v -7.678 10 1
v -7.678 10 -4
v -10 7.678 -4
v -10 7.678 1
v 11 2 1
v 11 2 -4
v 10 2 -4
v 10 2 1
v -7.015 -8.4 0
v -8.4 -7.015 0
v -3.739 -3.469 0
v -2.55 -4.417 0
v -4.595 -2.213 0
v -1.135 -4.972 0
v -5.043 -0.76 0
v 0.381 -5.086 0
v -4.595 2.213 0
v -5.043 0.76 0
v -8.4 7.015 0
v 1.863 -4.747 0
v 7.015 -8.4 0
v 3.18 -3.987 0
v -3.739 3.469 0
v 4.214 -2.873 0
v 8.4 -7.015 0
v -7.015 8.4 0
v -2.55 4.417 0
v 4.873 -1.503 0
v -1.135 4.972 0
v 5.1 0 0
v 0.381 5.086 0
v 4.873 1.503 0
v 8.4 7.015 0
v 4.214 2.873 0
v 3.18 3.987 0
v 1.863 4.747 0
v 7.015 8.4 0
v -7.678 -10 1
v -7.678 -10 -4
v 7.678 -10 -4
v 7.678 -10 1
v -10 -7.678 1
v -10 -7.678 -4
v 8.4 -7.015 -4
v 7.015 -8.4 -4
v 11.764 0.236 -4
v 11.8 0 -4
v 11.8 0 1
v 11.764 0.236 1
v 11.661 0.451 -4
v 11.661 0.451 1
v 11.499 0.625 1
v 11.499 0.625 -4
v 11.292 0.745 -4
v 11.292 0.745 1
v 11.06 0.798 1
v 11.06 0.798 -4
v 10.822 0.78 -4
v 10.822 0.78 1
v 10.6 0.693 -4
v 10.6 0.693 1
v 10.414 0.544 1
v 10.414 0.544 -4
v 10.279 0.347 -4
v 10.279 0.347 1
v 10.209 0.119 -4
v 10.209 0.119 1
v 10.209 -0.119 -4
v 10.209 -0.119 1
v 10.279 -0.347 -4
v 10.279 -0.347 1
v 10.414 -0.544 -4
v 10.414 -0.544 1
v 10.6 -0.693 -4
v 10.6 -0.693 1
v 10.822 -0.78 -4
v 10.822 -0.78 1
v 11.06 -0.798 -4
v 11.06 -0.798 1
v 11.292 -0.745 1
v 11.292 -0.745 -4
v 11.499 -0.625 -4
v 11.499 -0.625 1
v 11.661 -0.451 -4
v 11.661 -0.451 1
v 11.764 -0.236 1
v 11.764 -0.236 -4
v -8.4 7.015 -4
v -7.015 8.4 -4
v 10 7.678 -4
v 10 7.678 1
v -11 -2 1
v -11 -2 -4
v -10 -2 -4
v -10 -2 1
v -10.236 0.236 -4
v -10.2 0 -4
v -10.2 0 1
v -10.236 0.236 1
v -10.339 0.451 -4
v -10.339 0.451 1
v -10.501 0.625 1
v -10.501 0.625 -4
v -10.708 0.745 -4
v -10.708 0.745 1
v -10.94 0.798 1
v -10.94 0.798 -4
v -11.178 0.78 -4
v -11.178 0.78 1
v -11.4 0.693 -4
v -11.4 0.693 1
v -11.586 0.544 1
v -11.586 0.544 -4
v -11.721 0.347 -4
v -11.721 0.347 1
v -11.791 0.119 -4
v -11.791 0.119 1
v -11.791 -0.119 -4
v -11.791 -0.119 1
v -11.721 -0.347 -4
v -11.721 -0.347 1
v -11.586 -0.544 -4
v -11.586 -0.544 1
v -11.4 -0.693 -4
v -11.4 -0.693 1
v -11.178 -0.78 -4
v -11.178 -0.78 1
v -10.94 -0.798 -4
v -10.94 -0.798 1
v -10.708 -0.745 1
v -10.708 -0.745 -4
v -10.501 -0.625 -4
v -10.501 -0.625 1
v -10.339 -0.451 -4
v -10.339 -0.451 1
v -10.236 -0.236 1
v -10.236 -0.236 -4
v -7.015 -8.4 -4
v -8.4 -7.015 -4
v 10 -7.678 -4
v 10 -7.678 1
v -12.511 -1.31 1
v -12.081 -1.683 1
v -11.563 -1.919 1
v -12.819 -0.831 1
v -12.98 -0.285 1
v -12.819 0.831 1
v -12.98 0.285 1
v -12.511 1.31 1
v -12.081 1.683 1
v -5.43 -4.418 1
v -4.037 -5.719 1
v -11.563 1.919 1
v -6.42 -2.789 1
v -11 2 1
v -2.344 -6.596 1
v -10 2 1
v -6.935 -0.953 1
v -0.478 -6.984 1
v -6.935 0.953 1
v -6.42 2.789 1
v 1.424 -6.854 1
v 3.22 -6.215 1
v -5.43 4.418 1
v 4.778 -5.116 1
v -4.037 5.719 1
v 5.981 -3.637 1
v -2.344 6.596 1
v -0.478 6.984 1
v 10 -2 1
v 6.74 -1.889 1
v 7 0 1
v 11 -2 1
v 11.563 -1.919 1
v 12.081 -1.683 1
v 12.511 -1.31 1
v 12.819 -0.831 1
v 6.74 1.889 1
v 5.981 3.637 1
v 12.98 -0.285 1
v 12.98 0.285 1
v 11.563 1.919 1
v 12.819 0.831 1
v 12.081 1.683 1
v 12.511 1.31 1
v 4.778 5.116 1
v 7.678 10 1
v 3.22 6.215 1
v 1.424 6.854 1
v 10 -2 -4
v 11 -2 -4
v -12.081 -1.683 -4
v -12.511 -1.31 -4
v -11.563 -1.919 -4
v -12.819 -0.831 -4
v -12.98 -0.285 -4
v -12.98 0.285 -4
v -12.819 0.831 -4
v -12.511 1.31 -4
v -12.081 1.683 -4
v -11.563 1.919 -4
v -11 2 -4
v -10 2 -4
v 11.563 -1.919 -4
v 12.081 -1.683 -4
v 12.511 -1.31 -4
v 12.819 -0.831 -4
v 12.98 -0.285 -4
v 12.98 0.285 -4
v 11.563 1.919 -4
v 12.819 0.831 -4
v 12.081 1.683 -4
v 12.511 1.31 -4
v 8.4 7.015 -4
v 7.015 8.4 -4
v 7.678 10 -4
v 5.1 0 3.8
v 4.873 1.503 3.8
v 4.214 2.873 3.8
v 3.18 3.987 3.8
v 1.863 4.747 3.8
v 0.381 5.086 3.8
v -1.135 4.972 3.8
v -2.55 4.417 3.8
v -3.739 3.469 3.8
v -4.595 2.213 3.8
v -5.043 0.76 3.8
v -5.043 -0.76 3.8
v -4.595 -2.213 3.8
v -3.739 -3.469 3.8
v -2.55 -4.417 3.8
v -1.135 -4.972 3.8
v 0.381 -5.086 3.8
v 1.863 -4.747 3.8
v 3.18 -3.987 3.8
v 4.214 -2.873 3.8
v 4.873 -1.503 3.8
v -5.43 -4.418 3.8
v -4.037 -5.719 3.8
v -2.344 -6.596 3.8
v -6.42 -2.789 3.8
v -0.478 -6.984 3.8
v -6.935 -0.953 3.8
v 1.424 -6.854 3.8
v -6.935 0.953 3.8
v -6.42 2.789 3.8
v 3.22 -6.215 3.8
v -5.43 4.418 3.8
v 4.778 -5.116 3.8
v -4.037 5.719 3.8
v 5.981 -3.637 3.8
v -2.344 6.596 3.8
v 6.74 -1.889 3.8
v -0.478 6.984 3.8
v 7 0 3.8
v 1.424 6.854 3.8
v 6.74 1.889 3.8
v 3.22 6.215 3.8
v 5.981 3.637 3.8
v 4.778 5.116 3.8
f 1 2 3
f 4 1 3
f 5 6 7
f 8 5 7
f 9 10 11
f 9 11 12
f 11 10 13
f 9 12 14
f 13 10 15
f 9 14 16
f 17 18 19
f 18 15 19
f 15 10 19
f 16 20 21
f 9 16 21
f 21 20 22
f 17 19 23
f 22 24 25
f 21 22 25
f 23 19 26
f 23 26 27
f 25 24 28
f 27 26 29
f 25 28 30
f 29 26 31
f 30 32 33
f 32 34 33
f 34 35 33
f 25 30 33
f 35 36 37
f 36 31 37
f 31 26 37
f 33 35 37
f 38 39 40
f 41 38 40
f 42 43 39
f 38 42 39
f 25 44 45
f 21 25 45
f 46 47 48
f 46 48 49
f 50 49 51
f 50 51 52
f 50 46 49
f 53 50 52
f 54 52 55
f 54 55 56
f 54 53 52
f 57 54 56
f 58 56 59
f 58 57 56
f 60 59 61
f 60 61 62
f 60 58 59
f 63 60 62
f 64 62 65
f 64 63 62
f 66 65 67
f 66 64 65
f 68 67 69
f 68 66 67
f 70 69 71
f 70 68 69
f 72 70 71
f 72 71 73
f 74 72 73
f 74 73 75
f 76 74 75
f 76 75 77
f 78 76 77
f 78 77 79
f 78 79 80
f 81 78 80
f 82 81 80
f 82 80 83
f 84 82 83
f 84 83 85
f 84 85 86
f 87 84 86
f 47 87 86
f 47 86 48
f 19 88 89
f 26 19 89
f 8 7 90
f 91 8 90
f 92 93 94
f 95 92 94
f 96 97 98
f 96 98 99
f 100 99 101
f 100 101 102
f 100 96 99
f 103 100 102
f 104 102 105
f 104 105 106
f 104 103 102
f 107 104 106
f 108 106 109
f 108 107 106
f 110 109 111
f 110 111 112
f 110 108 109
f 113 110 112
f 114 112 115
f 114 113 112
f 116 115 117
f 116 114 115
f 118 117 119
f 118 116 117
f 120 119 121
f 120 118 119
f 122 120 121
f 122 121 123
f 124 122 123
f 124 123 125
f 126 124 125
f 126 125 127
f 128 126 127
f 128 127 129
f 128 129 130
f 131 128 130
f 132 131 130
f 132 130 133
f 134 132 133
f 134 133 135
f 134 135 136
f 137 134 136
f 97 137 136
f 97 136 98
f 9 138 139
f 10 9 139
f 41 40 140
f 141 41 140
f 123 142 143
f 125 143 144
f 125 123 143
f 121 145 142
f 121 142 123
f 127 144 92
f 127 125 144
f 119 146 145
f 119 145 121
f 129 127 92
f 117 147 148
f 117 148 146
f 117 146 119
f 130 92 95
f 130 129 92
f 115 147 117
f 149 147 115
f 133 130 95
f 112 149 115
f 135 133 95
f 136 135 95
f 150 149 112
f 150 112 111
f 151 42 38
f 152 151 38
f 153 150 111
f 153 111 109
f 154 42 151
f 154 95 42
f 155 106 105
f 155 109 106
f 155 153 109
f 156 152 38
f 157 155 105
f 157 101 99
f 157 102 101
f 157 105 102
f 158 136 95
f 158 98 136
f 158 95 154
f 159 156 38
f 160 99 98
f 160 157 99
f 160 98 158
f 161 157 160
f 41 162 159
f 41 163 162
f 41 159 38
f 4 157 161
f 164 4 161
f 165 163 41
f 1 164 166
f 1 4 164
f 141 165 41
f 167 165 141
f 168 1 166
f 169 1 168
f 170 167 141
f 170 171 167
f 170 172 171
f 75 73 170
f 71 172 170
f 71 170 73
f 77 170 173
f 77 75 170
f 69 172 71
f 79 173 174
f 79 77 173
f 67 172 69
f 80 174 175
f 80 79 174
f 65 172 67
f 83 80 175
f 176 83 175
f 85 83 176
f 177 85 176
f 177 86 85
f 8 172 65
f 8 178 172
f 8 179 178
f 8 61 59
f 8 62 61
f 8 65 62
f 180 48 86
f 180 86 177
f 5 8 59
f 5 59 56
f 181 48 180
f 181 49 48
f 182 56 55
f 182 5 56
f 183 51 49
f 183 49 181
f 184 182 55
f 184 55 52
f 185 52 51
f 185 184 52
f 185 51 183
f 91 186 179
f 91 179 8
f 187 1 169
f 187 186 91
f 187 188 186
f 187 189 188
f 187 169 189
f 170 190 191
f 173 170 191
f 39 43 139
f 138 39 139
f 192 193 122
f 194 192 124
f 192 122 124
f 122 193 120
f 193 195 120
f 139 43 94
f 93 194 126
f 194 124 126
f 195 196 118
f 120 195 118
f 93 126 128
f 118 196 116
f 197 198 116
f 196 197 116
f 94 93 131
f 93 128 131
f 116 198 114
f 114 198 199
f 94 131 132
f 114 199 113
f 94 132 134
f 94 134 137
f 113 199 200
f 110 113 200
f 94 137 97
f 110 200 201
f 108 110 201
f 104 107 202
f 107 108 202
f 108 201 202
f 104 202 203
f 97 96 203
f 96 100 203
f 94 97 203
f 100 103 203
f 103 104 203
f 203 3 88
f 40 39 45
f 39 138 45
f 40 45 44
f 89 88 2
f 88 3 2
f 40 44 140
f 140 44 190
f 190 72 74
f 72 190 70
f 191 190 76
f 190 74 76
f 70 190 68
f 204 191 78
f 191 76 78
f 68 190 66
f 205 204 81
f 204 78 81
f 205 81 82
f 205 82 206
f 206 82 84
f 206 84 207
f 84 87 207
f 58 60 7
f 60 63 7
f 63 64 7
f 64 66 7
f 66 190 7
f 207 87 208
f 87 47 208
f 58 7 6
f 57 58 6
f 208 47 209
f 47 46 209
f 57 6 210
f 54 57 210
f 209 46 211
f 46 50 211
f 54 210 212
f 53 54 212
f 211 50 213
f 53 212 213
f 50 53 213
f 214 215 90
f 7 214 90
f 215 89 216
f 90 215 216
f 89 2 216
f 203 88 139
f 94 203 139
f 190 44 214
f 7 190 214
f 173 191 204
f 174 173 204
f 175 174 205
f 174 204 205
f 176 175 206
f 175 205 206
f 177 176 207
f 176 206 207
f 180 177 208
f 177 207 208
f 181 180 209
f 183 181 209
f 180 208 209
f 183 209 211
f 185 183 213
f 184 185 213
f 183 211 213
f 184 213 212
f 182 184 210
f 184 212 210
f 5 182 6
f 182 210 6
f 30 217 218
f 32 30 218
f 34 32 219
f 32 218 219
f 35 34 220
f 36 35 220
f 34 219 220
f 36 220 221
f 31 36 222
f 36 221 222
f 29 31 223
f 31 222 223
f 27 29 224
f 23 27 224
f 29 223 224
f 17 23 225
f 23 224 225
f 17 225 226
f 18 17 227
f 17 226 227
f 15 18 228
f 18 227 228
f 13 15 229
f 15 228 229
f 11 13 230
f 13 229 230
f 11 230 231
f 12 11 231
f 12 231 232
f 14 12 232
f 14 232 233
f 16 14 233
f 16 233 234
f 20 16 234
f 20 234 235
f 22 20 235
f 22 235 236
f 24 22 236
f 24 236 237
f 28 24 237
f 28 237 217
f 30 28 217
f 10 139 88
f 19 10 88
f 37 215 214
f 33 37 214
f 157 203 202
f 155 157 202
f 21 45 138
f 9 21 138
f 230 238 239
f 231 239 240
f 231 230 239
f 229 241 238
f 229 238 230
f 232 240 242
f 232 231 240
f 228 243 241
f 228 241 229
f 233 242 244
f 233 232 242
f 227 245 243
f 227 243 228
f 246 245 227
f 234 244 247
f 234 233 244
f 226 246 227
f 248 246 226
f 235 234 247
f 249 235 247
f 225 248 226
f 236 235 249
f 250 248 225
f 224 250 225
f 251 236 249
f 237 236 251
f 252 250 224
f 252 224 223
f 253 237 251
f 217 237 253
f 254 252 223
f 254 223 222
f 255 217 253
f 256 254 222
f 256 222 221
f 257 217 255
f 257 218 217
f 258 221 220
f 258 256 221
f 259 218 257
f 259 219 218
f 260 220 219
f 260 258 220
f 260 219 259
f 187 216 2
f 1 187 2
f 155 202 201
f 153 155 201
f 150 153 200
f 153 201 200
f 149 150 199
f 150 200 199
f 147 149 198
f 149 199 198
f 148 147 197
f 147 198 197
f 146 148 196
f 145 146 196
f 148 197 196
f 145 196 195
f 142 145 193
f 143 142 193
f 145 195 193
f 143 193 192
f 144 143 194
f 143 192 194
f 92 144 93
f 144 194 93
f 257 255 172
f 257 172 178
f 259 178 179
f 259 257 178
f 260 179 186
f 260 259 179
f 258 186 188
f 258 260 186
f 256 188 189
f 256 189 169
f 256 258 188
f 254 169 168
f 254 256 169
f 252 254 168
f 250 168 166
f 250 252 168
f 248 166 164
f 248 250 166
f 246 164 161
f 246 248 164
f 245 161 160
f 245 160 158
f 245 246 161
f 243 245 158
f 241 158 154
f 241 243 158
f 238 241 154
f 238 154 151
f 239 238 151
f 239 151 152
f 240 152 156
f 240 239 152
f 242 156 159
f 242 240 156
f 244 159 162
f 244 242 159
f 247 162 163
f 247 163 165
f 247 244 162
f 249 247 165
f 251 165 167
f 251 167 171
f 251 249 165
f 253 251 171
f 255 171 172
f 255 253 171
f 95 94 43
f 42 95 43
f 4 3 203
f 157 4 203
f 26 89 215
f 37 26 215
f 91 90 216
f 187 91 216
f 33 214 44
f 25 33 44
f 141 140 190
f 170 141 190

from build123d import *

# Parameters (mm, degrees)
SKETCH1_R                = 0.8
ROOF_DEPTH               = 1
WALLS_START              = -4
SKETCH1_3_R              = 0.8
WALLS_DEPTH              = 4
SKETCH2_R                = 5.1
SCREW_HOLE_IN_ROOF_DEPTH = 18.146428369
SCREW_START              = 2.8
SKETCH2_3_R              = 7
SKETCH2_3_R_2            = 5.1
SCREW_HOLDER_DEPTH       = 2.8


with BuildPart() as part:
    # Sketch1 → Roof (new body)
    with BuildSketch(Plane.XY):
        with BuildLine():
            Line((-7.67766953, 10), (-10, 7.67766953))
            Line((-10, 7.67766953), (-10, 2))
            Line((-10, 2), (-11.000000224, 2))
            ThreePointArc((-11.000000224, 2), (-13.000000224, 0), (-11.000000224, -2))
            Line((-11.000000224, -2), (-10, -2))
            Line((-10, -2), (-10, -7.67766953))
            Line((-10, -7.67766953), (-7.67766953, -10))
            Line((-7.67766953, -10), (7.67766953, -10))
            Line((7.67766953, -10), (10, -7.67766953))
            Line((10, -7.67766953), (10, -2))
            Line((10, -2), (11, -2))
            ThreePointArc((11, -2), (13, 0), (11, 2))
            Line((11, 2), (10, 2))
            Line((10, 2), (10, 7.67766953))
            Line((10, 7.67766953), (7.67766953, 10))
            Line((7.67766953, 10), (-7.67766953, 10))
        make_face()
        with Locations((11, 0)):
            Circle(SKETCH1_R, mode=Mode.SUBTRACT)
        with Locations((-11.000000224, 0)):
            Circle(SKETCH1_R, mode=Mode.SUBTRACT)
    extrude(amount=ROOF_DEPTH)

    # Sketch1<3> → Walls (add)
    with BuildSketch(Plane.XY.offset(WALLS_START)):
        with BuildLine():
            Line((-7.67766953, 10), (-10, 7.67766953))
            Line((-10, 7.67766953), (-10, 2))
            Line((-10, 2), (-11.000000224, 2))
            ThreePointArc((-11.000000224, 2), (-13.000000224, 0), (-11.000000224, -2))
            Line((-11.000000224, -2), (-10, -2))
            Line((-10, -2), (-10, -7.67766953))
            Line((-10, -7.67766953), (-7.67766953, -10))
            Line((-7.67766953, -10), (7.67766953, -10))
            Line((7.67766953, -10), (10, -7.67766953))
            Line((10, -7.67766953), (10, -2))
            Line((10, -2), (11, -2))
            ThreePointArc((11, -2), (13, 0), (11, 2))
            Line((11, 2), (10, 2))
            Line((10, 2), (10, 7.67766953))
            Line((10, 7.67766953), (7.67766953, 10))
            Line((7.67766953, 10), (-7.67766953, 10))
        make_face()
        Polygon((-8.4, -7.01492783), (-8.4, 7.01492783), (-7.01492783, 8.4), (7.01492783, 8.4), (8.4, 7.01492783), (8.4, -7.01492783), (7.01492783, -8.4), (-7.01492783, -8.4), align=None, mode=Mode.SUBTRACT)
        with Locations((11, 0)):
            Circle(SKETCH1_3_R, mode=Mode.SUBTRACT)
        with Locations((-11.000000224, 0)):
            Circle(SKETCH1_3_R, mode=Mode.SUBTRACT)
    extrude(amount=WALLS_DEPTH)

    # Sketch2 → Screw hole in roof (cut, through all)
    with BuildSketch(Plane.XY.offset(1)):
        Circle(SKETCH2_R)
    extrude(amount=-SCREW_HOLE_IN_ROOF_DEPTH, mode=Mode.SUBTRACT)

    # Sketch2<3> → Screw holder (add)
    with BuildSketch(Plane.XY.offset(1).offset(SCREW_START)):
        Circle(SKETCH2_3_R)
        Circle(SKETCH2_3_R_2, mode=Mode.SUBTRACT)
    extrude(amount=-SCREW_HOLDER_DEPTH)


solid = part.part
